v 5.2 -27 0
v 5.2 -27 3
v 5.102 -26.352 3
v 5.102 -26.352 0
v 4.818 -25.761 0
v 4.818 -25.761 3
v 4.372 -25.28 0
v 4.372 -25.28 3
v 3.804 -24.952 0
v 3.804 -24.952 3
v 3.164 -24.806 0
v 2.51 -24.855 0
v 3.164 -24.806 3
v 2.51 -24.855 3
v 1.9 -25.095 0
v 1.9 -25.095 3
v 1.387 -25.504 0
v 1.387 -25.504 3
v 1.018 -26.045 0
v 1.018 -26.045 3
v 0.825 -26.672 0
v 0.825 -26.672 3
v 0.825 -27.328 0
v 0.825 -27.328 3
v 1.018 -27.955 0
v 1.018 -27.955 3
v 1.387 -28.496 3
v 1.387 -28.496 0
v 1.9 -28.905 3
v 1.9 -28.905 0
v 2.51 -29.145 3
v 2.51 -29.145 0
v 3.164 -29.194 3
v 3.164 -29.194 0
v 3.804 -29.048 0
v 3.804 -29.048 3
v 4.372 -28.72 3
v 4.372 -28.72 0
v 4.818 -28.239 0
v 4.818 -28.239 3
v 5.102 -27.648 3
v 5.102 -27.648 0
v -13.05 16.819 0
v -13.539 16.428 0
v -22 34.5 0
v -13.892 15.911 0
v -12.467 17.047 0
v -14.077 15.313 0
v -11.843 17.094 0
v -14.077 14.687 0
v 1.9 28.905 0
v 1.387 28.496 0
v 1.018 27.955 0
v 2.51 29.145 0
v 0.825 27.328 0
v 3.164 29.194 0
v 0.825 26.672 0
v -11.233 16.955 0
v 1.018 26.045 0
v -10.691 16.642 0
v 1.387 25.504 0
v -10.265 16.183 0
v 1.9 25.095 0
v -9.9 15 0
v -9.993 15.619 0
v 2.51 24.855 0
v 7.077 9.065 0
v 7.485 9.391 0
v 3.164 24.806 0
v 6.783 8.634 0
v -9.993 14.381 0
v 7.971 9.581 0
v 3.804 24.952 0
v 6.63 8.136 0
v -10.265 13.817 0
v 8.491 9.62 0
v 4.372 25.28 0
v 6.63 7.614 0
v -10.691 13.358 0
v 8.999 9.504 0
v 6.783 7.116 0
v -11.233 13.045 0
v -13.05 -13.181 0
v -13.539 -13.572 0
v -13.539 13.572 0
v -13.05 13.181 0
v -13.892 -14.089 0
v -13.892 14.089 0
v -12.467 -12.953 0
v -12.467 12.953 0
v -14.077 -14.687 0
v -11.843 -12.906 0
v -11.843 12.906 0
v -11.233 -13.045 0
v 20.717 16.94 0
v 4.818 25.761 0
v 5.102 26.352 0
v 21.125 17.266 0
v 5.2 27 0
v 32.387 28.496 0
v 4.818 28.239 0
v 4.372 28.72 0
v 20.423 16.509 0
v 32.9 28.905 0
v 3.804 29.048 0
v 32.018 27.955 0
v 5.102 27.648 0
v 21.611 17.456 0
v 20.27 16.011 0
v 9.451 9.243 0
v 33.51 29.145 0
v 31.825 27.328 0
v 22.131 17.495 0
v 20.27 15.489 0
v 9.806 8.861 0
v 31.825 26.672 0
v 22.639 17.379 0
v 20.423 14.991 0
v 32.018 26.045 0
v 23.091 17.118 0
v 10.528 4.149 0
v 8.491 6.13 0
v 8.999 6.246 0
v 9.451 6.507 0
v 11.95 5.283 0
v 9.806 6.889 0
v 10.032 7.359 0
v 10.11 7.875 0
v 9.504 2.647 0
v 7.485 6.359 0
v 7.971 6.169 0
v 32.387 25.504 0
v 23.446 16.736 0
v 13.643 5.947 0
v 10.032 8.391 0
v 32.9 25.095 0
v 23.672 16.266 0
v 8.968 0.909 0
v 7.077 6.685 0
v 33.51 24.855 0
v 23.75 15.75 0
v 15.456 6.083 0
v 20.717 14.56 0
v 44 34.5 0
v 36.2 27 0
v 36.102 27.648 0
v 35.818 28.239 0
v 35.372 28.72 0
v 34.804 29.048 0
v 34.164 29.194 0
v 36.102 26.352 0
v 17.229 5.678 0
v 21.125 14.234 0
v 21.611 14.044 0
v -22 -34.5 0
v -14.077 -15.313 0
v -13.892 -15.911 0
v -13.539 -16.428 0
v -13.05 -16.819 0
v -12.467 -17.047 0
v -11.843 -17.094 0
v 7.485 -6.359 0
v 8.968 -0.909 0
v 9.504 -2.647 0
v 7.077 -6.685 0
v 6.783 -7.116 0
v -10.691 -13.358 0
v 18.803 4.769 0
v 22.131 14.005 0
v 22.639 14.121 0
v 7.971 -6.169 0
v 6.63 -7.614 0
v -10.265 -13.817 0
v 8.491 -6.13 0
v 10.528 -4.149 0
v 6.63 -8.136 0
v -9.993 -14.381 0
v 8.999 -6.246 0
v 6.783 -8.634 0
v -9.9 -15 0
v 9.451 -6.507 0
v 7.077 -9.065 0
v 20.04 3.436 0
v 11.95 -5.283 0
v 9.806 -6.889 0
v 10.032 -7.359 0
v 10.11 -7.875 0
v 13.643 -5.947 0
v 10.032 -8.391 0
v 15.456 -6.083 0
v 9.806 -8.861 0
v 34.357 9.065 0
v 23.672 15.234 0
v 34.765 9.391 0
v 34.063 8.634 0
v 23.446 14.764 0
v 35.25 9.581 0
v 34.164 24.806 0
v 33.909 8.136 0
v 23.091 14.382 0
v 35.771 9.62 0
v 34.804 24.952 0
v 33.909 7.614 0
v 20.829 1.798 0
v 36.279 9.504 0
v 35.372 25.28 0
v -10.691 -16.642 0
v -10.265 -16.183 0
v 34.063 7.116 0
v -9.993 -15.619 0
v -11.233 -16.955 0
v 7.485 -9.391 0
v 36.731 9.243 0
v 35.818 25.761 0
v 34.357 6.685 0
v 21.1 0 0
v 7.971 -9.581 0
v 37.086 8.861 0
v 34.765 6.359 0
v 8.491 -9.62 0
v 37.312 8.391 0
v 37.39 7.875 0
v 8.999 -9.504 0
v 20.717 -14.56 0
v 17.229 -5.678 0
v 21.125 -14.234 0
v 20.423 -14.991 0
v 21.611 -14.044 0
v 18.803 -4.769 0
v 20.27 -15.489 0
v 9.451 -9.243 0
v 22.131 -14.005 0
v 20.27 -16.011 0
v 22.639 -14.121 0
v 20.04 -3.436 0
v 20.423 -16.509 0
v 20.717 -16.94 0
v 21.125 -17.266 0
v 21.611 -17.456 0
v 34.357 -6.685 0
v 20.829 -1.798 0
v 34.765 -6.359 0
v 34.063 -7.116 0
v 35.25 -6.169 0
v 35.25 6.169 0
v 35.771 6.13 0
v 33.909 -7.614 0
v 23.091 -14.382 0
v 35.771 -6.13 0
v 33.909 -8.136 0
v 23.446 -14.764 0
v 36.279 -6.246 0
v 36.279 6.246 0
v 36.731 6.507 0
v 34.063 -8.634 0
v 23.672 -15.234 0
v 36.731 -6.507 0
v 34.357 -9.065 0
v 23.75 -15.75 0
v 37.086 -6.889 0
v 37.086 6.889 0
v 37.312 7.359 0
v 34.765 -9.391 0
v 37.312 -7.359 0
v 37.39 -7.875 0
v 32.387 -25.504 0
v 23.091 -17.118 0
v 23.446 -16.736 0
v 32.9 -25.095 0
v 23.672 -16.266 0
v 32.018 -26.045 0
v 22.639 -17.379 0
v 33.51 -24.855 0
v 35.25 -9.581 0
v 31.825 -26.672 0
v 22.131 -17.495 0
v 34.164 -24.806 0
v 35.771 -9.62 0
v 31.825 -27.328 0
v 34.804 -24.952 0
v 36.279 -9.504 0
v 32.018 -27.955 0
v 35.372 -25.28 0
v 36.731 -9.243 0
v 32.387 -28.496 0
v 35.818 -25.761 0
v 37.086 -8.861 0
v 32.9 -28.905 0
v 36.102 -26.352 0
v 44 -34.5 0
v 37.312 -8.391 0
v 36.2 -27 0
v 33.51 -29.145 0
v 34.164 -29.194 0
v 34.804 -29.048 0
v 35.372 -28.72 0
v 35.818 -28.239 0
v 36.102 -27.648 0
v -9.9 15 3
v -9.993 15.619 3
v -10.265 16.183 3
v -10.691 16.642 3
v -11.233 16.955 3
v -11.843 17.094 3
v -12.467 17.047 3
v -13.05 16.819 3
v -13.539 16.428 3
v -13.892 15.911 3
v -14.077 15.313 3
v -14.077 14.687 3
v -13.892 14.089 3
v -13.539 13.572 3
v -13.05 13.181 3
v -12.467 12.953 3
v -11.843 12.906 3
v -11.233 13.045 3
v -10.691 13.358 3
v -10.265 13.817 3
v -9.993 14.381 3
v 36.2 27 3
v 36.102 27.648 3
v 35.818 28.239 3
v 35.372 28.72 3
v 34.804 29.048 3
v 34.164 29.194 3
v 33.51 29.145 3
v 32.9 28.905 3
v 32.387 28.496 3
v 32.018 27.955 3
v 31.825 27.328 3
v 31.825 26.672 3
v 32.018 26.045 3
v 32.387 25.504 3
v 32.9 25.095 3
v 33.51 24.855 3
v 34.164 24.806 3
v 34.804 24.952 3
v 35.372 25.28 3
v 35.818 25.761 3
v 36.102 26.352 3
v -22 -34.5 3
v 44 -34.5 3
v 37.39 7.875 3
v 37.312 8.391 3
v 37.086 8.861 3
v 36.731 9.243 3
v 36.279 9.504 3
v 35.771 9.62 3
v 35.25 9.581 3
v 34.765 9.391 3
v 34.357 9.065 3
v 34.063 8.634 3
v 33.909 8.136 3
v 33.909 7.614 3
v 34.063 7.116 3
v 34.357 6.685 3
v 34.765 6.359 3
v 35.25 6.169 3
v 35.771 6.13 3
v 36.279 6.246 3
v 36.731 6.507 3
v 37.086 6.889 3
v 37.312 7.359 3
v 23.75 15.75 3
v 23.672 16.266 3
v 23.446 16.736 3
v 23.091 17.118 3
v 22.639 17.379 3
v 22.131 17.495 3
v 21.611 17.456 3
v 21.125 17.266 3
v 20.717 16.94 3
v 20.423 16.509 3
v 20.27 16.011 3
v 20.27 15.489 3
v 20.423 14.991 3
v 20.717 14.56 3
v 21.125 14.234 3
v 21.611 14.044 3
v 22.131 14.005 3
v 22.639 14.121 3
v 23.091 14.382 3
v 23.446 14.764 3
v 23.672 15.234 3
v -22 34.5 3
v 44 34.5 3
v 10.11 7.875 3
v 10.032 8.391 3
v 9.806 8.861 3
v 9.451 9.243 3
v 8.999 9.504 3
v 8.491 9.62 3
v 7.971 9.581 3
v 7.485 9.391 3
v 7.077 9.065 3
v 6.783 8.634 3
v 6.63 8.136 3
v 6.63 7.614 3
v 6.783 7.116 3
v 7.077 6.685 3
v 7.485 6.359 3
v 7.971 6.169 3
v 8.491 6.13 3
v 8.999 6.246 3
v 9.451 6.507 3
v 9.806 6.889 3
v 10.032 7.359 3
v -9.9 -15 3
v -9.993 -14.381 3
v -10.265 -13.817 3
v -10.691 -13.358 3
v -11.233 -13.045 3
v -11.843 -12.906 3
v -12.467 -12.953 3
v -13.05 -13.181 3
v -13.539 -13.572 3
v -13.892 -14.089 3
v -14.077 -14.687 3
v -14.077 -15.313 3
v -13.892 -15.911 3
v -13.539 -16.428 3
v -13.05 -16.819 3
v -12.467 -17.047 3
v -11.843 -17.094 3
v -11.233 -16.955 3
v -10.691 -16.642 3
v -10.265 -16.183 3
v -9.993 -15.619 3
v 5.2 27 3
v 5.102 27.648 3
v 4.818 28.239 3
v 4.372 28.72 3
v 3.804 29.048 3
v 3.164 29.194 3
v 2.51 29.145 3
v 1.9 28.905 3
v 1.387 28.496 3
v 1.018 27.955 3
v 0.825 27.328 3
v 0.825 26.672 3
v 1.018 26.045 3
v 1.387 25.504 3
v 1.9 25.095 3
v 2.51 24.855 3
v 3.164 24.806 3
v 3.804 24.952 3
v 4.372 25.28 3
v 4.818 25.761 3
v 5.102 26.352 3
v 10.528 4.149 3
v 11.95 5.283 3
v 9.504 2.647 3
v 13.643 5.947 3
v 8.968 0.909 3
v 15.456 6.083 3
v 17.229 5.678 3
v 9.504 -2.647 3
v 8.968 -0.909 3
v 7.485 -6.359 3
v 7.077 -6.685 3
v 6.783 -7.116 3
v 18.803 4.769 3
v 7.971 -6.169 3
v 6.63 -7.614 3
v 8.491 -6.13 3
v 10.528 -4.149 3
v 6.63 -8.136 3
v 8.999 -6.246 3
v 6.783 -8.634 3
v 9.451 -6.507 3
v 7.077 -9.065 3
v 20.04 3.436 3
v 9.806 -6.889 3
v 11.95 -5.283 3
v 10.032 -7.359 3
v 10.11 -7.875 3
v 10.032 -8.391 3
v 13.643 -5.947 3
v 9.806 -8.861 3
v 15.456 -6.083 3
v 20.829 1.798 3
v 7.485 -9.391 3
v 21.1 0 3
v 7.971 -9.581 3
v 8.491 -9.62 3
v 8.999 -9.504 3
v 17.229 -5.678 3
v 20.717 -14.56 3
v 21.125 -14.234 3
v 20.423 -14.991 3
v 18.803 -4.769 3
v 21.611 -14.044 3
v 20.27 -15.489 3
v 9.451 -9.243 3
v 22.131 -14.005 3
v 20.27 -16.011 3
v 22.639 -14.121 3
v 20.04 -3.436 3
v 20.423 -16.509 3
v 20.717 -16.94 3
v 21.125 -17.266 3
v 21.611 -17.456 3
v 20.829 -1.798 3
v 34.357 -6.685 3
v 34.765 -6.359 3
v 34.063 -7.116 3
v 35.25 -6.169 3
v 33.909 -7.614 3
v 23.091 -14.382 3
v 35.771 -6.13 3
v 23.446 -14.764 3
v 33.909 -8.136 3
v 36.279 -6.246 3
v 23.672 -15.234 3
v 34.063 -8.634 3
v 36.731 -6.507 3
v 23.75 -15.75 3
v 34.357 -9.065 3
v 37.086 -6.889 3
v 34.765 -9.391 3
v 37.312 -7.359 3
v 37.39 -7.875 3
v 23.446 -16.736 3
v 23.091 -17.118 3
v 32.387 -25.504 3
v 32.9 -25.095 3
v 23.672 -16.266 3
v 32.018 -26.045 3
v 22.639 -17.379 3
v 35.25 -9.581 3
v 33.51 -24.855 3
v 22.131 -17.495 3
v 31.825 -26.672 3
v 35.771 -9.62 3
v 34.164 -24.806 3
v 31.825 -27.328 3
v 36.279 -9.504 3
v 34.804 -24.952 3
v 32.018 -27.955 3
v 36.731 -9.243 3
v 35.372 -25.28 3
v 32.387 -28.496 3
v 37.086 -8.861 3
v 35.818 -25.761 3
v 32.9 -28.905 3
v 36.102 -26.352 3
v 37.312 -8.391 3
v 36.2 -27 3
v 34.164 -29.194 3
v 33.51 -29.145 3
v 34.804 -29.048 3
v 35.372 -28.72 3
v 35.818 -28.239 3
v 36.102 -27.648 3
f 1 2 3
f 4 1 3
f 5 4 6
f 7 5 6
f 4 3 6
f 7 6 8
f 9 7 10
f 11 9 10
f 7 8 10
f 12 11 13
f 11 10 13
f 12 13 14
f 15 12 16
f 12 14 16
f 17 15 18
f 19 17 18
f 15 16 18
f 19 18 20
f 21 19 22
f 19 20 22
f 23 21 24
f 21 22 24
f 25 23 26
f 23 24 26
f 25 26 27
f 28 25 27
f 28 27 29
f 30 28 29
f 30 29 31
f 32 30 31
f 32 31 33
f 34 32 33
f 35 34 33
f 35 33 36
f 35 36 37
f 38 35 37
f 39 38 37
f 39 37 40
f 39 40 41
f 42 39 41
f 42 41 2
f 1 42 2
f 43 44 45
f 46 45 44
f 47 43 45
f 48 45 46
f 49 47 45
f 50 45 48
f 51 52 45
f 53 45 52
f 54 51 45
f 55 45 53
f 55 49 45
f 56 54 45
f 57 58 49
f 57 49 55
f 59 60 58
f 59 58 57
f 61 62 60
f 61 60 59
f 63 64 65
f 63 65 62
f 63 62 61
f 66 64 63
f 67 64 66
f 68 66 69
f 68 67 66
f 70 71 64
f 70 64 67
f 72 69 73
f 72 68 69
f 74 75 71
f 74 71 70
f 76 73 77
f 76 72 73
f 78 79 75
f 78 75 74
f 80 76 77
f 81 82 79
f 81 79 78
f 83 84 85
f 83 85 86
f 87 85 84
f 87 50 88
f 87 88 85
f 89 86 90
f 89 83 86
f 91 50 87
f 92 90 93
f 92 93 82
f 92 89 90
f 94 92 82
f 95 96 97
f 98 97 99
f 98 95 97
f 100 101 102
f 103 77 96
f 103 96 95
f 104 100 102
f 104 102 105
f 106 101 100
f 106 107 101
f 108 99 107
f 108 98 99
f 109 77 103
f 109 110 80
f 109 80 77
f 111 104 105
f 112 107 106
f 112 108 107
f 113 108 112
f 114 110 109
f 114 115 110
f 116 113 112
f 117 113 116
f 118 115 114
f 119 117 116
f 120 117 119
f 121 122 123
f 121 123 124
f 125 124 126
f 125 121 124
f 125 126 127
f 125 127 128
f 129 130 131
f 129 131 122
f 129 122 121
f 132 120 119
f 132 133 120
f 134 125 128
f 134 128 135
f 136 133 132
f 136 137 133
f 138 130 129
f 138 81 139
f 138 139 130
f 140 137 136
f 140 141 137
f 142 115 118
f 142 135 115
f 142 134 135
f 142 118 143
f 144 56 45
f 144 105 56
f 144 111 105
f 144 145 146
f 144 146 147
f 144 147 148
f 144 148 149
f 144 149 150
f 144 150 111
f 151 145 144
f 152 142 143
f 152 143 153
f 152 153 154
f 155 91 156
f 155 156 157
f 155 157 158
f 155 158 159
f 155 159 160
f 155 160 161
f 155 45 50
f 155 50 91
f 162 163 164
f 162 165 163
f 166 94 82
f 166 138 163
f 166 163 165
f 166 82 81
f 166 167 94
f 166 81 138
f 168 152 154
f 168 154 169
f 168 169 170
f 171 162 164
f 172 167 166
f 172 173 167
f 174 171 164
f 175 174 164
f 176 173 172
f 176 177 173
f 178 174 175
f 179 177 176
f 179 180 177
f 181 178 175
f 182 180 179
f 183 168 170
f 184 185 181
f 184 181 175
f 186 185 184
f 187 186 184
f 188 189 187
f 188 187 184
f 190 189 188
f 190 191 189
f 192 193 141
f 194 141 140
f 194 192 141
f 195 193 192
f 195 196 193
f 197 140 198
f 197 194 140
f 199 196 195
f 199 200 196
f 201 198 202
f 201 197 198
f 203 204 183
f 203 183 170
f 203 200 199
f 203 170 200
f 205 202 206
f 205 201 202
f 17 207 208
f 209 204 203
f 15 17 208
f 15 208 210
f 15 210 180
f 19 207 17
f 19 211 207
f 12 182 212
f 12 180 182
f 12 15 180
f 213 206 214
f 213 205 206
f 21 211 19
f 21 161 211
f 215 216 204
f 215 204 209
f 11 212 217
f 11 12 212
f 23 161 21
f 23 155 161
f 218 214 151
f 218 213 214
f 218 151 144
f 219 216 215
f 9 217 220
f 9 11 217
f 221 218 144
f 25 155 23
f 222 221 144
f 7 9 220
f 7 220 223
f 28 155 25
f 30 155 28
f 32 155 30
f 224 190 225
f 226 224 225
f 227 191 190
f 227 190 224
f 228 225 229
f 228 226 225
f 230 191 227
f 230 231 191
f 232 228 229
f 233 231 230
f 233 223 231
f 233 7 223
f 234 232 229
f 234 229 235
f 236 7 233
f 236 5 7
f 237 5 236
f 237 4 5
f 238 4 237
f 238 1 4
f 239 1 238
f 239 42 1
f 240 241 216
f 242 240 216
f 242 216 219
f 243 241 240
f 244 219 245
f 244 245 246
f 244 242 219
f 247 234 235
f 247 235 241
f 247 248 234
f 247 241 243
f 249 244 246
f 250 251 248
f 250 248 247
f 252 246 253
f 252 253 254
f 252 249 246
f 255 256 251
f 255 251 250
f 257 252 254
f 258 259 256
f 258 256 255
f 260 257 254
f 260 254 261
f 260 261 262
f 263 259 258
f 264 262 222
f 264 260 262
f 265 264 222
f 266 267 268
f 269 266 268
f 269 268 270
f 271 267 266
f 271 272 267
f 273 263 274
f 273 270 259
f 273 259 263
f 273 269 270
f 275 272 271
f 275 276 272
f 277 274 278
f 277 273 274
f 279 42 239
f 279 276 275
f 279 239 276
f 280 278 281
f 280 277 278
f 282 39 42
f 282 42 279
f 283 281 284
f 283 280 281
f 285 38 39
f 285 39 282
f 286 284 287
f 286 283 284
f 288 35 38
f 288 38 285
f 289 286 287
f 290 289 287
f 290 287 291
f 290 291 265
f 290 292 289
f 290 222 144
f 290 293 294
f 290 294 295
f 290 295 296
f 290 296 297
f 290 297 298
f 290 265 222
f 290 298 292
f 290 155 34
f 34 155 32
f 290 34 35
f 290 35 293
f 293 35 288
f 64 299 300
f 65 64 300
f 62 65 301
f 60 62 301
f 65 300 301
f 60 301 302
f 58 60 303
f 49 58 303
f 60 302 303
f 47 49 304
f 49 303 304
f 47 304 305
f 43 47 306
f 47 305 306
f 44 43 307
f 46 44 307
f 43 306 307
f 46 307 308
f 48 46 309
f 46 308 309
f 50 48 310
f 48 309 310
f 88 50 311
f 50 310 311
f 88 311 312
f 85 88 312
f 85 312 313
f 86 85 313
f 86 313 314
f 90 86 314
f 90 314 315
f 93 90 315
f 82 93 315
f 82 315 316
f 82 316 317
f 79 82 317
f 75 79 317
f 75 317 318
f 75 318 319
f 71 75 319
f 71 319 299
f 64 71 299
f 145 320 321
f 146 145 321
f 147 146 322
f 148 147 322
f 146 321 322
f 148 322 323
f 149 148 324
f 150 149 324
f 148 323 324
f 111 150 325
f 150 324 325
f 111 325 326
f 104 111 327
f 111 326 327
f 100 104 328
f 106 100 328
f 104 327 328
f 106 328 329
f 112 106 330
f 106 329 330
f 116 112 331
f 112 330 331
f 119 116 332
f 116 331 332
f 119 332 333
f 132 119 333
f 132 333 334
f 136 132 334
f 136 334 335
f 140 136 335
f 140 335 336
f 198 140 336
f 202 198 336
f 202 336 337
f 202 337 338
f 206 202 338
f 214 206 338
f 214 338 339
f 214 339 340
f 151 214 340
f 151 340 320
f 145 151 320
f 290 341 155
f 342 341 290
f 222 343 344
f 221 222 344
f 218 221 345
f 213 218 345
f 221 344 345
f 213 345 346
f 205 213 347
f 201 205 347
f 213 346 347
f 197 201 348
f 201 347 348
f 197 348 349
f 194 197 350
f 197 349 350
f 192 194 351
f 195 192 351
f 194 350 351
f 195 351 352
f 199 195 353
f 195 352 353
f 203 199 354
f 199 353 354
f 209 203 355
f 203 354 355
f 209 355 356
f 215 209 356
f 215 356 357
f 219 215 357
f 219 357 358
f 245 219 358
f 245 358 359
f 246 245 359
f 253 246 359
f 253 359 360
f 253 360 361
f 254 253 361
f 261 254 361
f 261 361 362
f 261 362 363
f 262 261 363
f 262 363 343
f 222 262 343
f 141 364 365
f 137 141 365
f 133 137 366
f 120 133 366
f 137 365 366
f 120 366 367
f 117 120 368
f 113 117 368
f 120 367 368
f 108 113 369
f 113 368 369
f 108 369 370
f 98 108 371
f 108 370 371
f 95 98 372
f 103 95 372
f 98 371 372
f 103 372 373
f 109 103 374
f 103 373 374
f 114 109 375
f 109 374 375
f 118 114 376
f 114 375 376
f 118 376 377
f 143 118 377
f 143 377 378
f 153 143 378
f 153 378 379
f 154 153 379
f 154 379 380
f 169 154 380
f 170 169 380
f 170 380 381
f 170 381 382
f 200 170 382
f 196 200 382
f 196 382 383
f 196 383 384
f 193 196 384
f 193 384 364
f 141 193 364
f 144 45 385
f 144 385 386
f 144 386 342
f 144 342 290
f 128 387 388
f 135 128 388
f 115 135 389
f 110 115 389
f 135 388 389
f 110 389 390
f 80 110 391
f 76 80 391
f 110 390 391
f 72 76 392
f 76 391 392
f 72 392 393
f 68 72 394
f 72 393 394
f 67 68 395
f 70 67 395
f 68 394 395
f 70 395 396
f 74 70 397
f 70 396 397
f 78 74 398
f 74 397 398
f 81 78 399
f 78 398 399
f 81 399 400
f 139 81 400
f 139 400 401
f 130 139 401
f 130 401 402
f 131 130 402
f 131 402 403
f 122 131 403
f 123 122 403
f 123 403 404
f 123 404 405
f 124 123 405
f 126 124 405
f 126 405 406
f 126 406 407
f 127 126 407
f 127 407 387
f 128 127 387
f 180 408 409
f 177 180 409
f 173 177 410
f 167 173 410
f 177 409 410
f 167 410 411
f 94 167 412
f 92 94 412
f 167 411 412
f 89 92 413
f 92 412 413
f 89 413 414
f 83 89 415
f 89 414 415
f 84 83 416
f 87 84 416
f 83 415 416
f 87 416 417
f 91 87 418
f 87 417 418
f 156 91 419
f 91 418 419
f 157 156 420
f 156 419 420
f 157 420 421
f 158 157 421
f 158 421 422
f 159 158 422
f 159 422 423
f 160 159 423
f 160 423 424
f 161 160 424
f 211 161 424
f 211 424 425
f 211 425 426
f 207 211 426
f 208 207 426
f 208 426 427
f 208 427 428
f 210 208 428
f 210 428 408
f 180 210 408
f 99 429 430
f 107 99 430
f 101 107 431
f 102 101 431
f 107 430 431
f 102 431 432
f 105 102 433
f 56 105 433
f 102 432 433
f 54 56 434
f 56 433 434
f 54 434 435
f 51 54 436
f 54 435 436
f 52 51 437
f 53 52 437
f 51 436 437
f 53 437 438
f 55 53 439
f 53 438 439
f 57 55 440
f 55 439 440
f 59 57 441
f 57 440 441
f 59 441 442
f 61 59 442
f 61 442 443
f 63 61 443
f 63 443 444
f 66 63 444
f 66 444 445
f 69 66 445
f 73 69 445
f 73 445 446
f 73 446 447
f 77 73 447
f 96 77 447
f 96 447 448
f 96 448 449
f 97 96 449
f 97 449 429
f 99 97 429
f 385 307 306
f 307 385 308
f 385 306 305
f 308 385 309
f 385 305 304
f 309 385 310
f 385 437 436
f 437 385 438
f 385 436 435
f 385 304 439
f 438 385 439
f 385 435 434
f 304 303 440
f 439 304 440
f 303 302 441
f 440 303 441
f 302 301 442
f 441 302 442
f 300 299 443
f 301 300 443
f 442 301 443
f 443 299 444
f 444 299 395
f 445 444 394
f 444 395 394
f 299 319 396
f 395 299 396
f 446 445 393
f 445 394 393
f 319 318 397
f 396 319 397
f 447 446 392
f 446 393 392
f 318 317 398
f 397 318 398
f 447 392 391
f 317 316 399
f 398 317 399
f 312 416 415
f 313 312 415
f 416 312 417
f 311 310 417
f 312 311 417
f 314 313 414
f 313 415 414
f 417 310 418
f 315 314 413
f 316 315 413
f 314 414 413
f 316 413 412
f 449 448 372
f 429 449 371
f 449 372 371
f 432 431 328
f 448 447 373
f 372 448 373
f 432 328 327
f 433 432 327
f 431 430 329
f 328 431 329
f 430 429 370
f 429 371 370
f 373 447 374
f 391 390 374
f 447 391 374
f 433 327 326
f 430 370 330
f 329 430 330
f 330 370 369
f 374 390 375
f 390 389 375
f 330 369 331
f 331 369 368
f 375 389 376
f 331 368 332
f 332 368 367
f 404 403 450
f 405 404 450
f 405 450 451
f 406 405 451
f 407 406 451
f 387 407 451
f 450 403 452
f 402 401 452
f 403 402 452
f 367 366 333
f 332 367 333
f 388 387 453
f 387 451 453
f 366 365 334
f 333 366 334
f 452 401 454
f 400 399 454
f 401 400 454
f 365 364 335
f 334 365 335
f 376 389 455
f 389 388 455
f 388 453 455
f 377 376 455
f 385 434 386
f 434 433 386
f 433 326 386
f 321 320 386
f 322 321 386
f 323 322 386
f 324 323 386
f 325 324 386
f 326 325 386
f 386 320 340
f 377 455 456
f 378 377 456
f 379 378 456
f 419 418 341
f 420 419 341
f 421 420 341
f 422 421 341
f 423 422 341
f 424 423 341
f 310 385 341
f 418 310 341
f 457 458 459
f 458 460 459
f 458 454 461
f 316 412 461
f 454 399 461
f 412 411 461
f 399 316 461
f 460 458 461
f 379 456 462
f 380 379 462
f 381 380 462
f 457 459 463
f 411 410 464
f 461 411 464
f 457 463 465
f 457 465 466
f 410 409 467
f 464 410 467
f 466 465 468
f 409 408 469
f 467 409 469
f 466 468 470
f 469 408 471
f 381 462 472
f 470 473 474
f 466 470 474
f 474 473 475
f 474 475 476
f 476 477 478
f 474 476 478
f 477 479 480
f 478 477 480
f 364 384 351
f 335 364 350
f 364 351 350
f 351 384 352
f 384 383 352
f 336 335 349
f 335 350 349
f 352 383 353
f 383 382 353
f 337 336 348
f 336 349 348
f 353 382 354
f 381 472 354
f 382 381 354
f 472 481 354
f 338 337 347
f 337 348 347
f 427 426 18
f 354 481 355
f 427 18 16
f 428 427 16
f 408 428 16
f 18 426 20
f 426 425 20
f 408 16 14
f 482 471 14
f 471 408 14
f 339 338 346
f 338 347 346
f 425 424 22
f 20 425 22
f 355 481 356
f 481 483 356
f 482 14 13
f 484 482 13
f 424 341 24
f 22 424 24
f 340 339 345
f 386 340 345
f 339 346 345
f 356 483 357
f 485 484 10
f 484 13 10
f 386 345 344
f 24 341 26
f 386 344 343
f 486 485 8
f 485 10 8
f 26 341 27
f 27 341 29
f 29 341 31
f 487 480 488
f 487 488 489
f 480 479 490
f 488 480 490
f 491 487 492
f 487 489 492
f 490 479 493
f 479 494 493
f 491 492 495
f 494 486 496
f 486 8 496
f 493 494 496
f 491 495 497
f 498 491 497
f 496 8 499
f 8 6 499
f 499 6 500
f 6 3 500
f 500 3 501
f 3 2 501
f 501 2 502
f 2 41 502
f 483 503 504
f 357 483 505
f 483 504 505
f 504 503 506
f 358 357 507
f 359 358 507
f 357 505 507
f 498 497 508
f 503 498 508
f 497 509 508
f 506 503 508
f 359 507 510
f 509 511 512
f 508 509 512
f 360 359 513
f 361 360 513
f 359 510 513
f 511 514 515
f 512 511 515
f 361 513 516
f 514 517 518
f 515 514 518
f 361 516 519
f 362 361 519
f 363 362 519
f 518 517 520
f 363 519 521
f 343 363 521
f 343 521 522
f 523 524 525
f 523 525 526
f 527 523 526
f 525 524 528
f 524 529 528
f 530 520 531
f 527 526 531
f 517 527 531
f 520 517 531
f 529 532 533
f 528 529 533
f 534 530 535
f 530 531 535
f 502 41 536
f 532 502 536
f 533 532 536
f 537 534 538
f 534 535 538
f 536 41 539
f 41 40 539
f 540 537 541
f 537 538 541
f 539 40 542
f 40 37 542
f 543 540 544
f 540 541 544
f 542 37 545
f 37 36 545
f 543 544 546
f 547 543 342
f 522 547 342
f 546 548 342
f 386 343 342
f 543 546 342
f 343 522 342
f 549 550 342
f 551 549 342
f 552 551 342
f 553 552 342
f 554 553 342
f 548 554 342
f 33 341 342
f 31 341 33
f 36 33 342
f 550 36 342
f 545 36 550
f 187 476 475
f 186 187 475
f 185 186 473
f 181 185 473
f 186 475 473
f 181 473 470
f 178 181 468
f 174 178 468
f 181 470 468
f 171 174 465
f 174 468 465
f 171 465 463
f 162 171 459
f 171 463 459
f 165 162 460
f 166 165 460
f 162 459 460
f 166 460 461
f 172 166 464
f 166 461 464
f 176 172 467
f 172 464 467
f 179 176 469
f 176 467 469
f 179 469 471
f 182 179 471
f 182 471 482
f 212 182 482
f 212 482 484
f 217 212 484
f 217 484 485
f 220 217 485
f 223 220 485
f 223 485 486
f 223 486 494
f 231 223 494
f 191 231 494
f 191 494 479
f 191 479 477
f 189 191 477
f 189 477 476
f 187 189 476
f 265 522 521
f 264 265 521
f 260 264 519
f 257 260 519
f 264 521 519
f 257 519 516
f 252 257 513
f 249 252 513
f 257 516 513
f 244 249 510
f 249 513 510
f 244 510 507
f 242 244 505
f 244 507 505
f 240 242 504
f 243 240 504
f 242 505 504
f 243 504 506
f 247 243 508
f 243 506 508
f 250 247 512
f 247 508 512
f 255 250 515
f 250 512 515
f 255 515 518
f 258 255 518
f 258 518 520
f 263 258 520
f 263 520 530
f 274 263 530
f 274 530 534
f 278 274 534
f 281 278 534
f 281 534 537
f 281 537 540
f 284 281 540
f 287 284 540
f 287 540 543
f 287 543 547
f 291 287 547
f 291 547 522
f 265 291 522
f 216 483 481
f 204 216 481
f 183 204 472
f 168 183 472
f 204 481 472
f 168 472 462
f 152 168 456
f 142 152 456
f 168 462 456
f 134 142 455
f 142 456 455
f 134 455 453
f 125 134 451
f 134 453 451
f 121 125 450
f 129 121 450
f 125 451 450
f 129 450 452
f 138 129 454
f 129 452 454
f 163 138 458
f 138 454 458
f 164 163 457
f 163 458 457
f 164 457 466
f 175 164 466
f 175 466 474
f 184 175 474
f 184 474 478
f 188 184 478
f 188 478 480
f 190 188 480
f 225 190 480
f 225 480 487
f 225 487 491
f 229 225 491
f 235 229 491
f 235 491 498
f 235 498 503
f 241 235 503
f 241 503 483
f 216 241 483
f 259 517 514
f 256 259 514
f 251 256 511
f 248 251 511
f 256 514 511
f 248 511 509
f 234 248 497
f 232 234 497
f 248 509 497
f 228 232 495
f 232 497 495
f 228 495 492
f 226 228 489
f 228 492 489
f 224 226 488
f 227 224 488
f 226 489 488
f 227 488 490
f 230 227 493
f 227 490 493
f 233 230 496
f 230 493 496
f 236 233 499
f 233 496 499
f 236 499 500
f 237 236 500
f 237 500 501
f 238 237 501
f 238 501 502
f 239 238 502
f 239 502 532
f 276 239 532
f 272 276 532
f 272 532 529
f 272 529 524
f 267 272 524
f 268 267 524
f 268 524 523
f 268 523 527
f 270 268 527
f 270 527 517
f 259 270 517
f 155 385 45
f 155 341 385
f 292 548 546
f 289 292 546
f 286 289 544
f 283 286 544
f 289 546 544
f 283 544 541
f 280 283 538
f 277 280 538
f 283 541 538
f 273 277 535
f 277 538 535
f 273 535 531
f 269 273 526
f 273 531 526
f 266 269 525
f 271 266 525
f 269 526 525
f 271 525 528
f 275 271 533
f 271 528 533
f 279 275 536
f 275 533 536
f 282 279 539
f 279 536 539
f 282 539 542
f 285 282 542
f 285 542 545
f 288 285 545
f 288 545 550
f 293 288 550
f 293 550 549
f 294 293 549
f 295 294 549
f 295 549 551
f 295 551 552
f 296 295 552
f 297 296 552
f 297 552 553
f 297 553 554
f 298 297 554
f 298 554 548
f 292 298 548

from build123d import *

# Parameters (mm, degrees)
SKETCH_1_W          = 40
SKETCH_1_H          = 29
EXTRUDE_1_DEPTH     = 3
SKETCH_3_W          = 40
SKETCH_3_H          = 3
EXTRUDE_2_DEPTH     = 10
SKETCH_4_W          = 40
SKETCH_4_H          = 3
EXTRUDE_3_DEPTH     = 10
SKETCH_6_W          = 3
SKETCH_6_H          = 49
EXTRUDE_5_DEPTH     = 42
SKETCH_8_W          = 3
SKETCH_8_H          = 49
EXTRUDE_6_DEPTH     = 2
SKETCH_9_W          = 3
SKETCH_9_H          = 49
EXTRUDE_7_DEPTH     = 2
SKETCH_10_W         = 86
SKETCH_10_H         = 3
EXTRUDE_8_DEPTH     = 10
SKETCH_11_W         = 86
SKETCH_11_H         = 3
EXTRUDE_9_DEPTH     = 10
SKETCH_12_R         = 2.2
CUT_EXTRUDE_3_DEPTH = 7.5
SKETCH_7_R          = 1.75
SKETCH_7_R_2        = 6.1
CUT_EXTRUDE_4_DEPTH = 10
SKETCH_13_R         = 2.1
CUT_EXTRUDE_5_DEPTH = 10
SKETCH_14_W         = 3
SKETCH_14_H         = 69
CUT_EXTRUDE_6_DEPTH = 20


with BuildPart() as part:
    # Sketch 1 → Extrude 1 (new body)
    with BuildSketch(Plane.XY):
        Rectangle(SKETCH_1_W, SKETCH_1_H)
    extrude(amount=EXTRUDE_1_DEPTH)

    # Sketch 3 → Extrude 2 (add)
    with BuildSketch(Plane.XZ.offset(14.5)):
        with Locations((0, 1.5)):
            Rectangle(SKETCH_3_W, SKETCH_3_H)
    extrude(amount=EXTRUDE_2_DEPTH)

    # Sketch 4 → Extrude 3 (add)
    with BuildSketch(Plane(origin=(0, 14.5, 0), x_dir=(1, 0, 0), z_dir=(0, 1, 0))):
        with Locations((0, -1.5)):
            Rectangle(SKETCH_4_W, SKETCH_4_H)
    extrude(amount=EXTRUDE_3_DEPTH)

    # Sketch 6 → Extrude 5 (add)
    with BuildSketch(Plane(origin=(20, 0, 0), x_dir=(0, 0, -1), z_dir=(1, 0, 0))):
        with Locations((-1.5, 0)):
            Rectangle(SKETCH_6_W, SKETCH_6_H)
    extrude(amount=EXTRUDE_5_DEPTH)

    # Sketch 8 → Extrude 6 (add)
    with BuildSketch(Plane.ZY.offset(20)):
        with Locations((1.5, 0)):
            Rectangle(SKETCH_8_W, SKETCH_8_H)
    extrude(amount=EXTRUDE_6_DEPTH)

    # Sketch 9 → Extrude 7 (add)
    with BuildSketch(Plane(origin=(62, 0, 0), x_dir=(0, 0, -1), z_dir=(1, 0, 0))):
        with Locations((-1.5, 0)):
            Rectangle(SKETCH_9_W, SKETCH_9_H)
    extrude(amount=EXTRUDE_7_DEPTH)

    # Sketch 10 → Extrude 8 (add)
    with BuildSketch(Plane.XZ.offset(24.5)):
        with Locations((21, 1.5)):
            Rectangle(SKETCH_10_W, SKETCH_10_H)
    extrude(amount=EXTRUDE_8_DEPTH)

    # Sketch 11 → Extrude 9 (add)
    with BuildSketch(Plane(origin=(0, 24.5, 0), x_dir=(1, 0, 0), z_dir=(0, 1, 0))):
        with Locations((21, -1.5)):
            Rectangle(SKETCH_11_W, SKETCH_11_H)
    extrude(amount=EXTRUDE_9_DEPTH)

    # Sketch 12 → Cut-Extrude 3 (cut)
    with BuildSketch(Plane.XY.offset(3)):
        with Locations((34, -27)):
            Circle(SKETCH_12_R)
        with Locations((34, 27)):
            Circle(SKETCH_12_R)
        with Locations((3, -27)):
            Circle(SKETCH_12_R)
        with Locations((3, 27)):
            Circle(SKETCH_12_R)
    extrude(amount=-CUT_EXTRUDE_3_DEPTH, mode=Mode.SUBTRACT)

    # Sketch 7 → Cut-Extrude 4 (cut)
    with BuildSketch(Plane.XY.offset(3)):
        with Locations((35.63990011, 7.875)):
            Circle(SKETCH_7_R)
        with Locations((35.63990011, -7.875)):
            Circle(SKETCH_7_R)
        with Locations((15, 0)):
            Circle(SKETCH_7_R_2)
        with Locations((22, 15.75)):
            Circle(SKETCH_7_R)
        with Locations((22, -15.75)):
            Circle(SKETCH_7_R)
        with Locations((8.36009989, 7.875)):
            Circle(SKETCH_7_R)
        with Locations((8.36009989, -7.875)):
            Circle(SKETCH_7_R)
    extrude(amount=-CUT_EXTRUDE_4_DEPTH, mode=Mode.SUBTRACT)

    # Sketch 13 → Cut-Extrude 5 (cut)
    with BuildSketch(Plane.XY.offset(3)):
        with Locations((-12, -15)):
            Circle(SKETCH_13_R)
        with Locations((-12, 15)):
            Circle(SKETCH_13_R)
    extrude(amount=-CUT_EXTRUDE_5_DEPTH, mode=Mode.SUBTRACT)

    # Sketch 14 → Cut-Extrude 6 (cut)
    with BuildSketch(Plane(origin=(64, 0, 0), x_dir=(0, 0, -1), z_dir=(1, 0, 0))):
        with Locations((-1.5, 0)):
            Rectangle(SKETCH_14_W, SKETCH_14_H)
    extrude(amount=-CUT_EXTRUDE_6_DEPTH, mode=Mode.SUBTRACT)


solid = part.part
